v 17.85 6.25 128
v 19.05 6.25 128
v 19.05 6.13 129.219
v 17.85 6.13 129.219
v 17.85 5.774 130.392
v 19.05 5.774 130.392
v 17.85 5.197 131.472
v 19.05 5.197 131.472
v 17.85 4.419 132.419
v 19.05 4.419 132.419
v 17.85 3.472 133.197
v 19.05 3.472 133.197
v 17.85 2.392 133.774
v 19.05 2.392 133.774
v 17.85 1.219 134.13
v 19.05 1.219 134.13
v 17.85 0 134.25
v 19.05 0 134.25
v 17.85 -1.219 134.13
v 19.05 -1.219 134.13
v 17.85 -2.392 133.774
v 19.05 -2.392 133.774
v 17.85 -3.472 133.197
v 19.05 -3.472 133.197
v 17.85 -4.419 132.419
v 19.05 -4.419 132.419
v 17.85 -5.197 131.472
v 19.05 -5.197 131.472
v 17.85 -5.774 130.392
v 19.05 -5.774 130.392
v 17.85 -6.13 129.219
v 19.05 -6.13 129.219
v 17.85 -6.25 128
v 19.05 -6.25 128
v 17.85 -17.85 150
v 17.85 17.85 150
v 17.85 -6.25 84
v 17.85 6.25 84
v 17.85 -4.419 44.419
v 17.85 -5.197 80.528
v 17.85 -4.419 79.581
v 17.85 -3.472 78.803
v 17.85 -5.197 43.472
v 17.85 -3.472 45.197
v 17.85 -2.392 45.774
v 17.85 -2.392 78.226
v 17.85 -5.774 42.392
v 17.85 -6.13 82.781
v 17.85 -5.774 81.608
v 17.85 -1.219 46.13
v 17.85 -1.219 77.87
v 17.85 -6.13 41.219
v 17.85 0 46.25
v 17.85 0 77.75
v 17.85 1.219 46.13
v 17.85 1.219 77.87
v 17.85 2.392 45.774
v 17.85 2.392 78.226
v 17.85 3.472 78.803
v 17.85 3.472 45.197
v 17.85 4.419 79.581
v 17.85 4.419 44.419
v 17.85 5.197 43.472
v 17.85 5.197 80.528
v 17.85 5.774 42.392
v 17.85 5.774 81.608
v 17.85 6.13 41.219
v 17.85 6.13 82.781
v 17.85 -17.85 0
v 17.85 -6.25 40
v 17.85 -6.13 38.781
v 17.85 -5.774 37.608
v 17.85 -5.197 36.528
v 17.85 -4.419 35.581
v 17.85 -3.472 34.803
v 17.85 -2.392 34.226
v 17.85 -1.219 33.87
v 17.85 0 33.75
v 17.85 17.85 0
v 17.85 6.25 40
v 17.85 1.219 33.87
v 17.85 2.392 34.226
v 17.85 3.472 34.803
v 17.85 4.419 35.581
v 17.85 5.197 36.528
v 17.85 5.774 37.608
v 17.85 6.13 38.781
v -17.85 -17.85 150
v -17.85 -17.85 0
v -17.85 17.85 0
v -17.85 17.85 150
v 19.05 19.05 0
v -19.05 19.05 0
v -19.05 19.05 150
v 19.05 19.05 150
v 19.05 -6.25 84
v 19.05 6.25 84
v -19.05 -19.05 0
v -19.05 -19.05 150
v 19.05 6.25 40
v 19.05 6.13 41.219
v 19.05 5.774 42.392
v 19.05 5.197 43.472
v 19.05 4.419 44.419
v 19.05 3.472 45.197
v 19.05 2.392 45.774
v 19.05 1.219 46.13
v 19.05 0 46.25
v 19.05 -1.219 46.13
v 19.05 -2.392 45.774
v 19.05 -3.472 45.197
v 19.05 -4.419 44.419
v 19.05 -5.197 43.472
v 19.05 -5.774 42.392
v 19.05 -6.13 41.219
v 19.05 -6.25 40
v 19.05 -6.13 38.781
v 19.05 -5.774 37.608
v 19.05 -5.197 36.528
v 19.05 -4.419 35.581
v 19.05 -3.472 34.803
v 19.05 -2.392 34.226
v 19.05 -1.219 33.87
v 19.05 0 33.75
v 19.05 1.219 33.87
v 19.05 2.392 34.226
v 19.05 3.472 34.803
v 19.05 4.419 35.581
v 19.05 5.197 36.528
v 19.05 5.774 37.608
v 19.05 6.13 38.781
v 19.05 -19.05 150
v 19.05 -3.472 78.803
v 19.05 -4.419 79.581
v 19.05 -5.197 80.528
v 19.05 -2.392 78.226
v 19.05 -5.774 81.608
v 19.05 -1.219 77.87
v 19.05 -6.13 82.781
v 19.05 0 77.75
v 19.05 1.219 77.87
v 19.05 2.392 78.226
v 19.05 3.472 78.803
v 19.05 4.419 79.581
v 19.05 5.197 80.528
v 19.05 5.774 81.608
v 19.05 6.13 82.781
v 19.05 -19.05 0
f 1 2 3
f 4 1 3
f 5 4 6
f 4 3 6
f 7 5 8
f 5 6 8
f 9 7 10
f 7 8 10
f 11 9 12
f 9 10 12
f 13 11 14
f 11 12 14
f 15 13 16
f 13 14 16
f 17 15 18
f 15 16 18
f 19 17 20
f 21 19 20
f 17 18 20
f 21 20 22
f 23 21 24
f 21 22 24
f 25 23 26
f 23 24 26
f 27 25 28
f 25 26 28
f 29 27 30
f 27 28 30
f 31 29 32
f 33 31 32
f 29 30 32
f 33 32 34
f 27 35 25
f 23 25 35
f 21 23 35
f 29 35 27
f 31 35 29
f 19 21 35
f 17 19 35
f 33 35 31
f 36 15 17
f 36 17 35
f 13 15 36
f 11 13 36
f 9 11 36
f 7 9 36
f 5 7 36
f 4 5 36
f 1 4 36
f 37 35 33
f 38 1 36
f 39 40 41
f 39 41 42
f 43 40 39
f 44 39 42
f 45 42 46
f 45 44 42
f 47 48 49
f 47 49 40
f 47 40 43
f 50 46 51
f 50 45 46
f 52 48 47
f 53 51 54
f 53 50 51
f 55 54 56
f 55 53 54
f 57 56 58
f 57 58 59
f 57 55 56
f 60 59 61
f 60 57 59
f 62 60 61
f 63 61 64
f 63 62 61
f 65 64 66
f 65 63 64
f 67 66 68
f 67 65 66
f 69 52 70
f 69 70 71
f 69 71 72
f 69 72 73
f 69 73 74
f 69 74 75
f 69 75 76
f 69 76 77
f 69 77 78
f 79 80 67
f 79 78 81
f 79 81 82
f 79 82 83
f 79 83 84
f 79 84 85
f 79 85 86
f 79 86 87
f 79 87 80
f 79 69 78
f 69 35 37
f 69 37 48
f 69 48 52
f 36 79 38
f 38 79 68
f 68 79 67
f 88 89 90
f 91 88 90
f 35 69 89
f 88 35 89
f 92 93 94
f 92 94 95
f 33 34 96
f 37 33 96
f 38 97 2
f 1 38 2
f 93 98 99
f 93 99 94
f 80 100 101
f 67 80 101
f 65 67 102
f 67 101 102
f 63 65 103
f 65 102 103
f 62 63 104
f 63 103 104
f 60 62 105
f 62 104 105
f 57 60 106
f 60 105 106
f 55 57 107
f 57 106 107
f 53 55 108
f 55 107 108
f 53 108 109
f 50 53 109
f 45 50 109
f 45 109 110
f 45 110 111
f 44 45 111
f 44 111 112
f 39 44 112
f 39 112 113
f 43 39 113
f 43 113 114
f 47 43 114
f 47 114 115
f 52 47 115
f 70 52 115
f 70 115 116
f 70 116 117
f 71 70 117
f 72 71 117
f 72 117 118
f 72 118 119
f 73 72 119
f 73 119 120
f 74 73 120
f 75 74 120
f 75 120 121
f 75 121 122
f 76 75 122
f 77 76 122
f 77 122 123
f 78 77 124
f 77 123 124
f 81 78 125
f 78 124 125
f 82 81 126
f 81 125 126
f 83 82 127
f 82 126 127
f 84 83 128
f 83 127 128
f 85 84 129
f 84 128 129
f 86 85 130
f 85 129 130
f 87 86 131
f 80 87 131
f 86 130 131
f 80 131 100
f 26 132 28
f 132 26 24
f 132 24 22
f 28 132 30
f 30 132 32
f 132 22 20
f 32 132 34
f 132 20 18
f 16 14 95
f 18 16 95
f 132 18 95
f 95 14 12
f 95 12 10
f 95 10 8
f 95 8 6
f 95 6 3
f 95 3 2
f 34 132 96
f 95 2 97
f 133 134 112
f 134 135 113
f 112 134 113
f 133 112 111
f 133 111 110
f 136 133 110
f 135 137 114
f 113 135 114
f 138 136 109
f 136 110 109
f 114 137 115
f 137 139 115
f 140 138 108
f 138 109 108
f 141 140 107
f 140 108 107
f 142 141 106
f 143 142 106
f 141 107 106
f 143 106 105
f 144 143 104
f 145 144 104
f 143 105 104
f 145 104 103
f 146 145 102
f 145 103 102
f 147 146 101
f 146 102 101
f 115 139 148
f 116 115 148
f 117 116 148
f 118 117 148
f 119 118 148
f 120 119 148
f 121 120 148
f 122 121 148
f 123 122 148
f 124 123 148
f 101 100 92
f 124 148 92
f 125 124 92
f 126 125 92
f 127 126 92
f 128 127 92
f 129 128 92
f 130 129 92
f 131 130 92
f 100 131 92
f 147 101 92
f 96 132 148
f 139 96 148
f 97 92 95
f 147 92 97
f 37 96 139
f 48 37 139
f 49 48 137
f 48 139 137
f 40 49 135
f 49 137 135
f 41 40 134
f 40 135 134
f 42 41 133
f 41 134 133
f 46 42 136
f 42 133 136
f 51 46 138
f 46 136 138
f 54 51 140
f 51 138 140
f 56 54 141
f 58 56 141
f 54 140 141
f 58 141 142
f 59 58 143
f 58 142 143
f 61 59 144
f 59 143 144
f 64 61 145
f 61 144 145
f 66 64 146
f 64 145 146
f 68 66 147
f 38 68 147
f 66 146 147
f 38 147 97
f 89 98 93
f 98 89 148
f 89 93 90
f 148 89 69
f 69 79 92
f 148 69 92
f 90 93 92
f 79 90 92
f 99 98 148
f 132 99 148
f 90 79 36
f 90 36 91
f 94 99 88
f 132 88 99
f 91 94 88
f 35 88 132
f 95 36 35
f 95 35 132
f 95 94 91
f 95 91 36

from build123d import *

# Parameters (mm, degrees)
CROQUIS1_W              = 38.1
CROQUIS1_H              = 38.1
SALIENTE_EXTRUIR1_DEPTH = 150
CROQUIS4_W              = 35.7
CROQUIS4_H              = 35.7
CORTAR_EXTRUIR3_DEPTH   = 300
CROQUIS2_R              = 6.25
CORTAR_EXTRUIR5_DEPTH   = 10


with BuildPart() as part:
    # Croquis1 → Saliente-Extruir1 (new body)
    with BuildSketch(Plane.XY):
        Rectangle(CROQUIS1_W, CROQUIS1_H)
    extrude(amount=SALIENTE_EXTRUIR1_DEPTH)

    # Croquis4 → Cortar-Extruir3 (cut)
    with BuildSketch(Plane(origin=(0, 0, 0), x_dir=(-1, 0, 0), z_dir=(0, 0, -1))):
        Rectangle(CROQUIS4_W, CROQUIS4_H)
    extrude(amount=-CORTAR_EXTRUIR3_DEPTH, mode=Mode.SUBTRACT)

    # Croquis2 → Cortar-Extruir5 (cut)
    with BuildSketch(Plane(origin=(19.05, 0, 0), x_dir=(0, 0, -1), z_dir=(1, 0, 0))):
        with Locations(Location((-40, 0, 0), (0, 0, 90))):
            Circle(CROQUIS2_R)
        with BuildLine():
            Line((-128, -6.25), (-84, -6.25))
            ThreePointArc((-84, -6.25), (-77.75, 0), (-84, 6.25))
            Line((-84, 6.25), (-128, 6.25))
            ThreePointArc((-128, 6.25), (-134.25, 0), (-128, -6.25))
        make_face()
    extrude(amount=-CORTAR_EXTRUIR5_DEPTH, mode=Mode.SUBTRACT)


solid = part.part
